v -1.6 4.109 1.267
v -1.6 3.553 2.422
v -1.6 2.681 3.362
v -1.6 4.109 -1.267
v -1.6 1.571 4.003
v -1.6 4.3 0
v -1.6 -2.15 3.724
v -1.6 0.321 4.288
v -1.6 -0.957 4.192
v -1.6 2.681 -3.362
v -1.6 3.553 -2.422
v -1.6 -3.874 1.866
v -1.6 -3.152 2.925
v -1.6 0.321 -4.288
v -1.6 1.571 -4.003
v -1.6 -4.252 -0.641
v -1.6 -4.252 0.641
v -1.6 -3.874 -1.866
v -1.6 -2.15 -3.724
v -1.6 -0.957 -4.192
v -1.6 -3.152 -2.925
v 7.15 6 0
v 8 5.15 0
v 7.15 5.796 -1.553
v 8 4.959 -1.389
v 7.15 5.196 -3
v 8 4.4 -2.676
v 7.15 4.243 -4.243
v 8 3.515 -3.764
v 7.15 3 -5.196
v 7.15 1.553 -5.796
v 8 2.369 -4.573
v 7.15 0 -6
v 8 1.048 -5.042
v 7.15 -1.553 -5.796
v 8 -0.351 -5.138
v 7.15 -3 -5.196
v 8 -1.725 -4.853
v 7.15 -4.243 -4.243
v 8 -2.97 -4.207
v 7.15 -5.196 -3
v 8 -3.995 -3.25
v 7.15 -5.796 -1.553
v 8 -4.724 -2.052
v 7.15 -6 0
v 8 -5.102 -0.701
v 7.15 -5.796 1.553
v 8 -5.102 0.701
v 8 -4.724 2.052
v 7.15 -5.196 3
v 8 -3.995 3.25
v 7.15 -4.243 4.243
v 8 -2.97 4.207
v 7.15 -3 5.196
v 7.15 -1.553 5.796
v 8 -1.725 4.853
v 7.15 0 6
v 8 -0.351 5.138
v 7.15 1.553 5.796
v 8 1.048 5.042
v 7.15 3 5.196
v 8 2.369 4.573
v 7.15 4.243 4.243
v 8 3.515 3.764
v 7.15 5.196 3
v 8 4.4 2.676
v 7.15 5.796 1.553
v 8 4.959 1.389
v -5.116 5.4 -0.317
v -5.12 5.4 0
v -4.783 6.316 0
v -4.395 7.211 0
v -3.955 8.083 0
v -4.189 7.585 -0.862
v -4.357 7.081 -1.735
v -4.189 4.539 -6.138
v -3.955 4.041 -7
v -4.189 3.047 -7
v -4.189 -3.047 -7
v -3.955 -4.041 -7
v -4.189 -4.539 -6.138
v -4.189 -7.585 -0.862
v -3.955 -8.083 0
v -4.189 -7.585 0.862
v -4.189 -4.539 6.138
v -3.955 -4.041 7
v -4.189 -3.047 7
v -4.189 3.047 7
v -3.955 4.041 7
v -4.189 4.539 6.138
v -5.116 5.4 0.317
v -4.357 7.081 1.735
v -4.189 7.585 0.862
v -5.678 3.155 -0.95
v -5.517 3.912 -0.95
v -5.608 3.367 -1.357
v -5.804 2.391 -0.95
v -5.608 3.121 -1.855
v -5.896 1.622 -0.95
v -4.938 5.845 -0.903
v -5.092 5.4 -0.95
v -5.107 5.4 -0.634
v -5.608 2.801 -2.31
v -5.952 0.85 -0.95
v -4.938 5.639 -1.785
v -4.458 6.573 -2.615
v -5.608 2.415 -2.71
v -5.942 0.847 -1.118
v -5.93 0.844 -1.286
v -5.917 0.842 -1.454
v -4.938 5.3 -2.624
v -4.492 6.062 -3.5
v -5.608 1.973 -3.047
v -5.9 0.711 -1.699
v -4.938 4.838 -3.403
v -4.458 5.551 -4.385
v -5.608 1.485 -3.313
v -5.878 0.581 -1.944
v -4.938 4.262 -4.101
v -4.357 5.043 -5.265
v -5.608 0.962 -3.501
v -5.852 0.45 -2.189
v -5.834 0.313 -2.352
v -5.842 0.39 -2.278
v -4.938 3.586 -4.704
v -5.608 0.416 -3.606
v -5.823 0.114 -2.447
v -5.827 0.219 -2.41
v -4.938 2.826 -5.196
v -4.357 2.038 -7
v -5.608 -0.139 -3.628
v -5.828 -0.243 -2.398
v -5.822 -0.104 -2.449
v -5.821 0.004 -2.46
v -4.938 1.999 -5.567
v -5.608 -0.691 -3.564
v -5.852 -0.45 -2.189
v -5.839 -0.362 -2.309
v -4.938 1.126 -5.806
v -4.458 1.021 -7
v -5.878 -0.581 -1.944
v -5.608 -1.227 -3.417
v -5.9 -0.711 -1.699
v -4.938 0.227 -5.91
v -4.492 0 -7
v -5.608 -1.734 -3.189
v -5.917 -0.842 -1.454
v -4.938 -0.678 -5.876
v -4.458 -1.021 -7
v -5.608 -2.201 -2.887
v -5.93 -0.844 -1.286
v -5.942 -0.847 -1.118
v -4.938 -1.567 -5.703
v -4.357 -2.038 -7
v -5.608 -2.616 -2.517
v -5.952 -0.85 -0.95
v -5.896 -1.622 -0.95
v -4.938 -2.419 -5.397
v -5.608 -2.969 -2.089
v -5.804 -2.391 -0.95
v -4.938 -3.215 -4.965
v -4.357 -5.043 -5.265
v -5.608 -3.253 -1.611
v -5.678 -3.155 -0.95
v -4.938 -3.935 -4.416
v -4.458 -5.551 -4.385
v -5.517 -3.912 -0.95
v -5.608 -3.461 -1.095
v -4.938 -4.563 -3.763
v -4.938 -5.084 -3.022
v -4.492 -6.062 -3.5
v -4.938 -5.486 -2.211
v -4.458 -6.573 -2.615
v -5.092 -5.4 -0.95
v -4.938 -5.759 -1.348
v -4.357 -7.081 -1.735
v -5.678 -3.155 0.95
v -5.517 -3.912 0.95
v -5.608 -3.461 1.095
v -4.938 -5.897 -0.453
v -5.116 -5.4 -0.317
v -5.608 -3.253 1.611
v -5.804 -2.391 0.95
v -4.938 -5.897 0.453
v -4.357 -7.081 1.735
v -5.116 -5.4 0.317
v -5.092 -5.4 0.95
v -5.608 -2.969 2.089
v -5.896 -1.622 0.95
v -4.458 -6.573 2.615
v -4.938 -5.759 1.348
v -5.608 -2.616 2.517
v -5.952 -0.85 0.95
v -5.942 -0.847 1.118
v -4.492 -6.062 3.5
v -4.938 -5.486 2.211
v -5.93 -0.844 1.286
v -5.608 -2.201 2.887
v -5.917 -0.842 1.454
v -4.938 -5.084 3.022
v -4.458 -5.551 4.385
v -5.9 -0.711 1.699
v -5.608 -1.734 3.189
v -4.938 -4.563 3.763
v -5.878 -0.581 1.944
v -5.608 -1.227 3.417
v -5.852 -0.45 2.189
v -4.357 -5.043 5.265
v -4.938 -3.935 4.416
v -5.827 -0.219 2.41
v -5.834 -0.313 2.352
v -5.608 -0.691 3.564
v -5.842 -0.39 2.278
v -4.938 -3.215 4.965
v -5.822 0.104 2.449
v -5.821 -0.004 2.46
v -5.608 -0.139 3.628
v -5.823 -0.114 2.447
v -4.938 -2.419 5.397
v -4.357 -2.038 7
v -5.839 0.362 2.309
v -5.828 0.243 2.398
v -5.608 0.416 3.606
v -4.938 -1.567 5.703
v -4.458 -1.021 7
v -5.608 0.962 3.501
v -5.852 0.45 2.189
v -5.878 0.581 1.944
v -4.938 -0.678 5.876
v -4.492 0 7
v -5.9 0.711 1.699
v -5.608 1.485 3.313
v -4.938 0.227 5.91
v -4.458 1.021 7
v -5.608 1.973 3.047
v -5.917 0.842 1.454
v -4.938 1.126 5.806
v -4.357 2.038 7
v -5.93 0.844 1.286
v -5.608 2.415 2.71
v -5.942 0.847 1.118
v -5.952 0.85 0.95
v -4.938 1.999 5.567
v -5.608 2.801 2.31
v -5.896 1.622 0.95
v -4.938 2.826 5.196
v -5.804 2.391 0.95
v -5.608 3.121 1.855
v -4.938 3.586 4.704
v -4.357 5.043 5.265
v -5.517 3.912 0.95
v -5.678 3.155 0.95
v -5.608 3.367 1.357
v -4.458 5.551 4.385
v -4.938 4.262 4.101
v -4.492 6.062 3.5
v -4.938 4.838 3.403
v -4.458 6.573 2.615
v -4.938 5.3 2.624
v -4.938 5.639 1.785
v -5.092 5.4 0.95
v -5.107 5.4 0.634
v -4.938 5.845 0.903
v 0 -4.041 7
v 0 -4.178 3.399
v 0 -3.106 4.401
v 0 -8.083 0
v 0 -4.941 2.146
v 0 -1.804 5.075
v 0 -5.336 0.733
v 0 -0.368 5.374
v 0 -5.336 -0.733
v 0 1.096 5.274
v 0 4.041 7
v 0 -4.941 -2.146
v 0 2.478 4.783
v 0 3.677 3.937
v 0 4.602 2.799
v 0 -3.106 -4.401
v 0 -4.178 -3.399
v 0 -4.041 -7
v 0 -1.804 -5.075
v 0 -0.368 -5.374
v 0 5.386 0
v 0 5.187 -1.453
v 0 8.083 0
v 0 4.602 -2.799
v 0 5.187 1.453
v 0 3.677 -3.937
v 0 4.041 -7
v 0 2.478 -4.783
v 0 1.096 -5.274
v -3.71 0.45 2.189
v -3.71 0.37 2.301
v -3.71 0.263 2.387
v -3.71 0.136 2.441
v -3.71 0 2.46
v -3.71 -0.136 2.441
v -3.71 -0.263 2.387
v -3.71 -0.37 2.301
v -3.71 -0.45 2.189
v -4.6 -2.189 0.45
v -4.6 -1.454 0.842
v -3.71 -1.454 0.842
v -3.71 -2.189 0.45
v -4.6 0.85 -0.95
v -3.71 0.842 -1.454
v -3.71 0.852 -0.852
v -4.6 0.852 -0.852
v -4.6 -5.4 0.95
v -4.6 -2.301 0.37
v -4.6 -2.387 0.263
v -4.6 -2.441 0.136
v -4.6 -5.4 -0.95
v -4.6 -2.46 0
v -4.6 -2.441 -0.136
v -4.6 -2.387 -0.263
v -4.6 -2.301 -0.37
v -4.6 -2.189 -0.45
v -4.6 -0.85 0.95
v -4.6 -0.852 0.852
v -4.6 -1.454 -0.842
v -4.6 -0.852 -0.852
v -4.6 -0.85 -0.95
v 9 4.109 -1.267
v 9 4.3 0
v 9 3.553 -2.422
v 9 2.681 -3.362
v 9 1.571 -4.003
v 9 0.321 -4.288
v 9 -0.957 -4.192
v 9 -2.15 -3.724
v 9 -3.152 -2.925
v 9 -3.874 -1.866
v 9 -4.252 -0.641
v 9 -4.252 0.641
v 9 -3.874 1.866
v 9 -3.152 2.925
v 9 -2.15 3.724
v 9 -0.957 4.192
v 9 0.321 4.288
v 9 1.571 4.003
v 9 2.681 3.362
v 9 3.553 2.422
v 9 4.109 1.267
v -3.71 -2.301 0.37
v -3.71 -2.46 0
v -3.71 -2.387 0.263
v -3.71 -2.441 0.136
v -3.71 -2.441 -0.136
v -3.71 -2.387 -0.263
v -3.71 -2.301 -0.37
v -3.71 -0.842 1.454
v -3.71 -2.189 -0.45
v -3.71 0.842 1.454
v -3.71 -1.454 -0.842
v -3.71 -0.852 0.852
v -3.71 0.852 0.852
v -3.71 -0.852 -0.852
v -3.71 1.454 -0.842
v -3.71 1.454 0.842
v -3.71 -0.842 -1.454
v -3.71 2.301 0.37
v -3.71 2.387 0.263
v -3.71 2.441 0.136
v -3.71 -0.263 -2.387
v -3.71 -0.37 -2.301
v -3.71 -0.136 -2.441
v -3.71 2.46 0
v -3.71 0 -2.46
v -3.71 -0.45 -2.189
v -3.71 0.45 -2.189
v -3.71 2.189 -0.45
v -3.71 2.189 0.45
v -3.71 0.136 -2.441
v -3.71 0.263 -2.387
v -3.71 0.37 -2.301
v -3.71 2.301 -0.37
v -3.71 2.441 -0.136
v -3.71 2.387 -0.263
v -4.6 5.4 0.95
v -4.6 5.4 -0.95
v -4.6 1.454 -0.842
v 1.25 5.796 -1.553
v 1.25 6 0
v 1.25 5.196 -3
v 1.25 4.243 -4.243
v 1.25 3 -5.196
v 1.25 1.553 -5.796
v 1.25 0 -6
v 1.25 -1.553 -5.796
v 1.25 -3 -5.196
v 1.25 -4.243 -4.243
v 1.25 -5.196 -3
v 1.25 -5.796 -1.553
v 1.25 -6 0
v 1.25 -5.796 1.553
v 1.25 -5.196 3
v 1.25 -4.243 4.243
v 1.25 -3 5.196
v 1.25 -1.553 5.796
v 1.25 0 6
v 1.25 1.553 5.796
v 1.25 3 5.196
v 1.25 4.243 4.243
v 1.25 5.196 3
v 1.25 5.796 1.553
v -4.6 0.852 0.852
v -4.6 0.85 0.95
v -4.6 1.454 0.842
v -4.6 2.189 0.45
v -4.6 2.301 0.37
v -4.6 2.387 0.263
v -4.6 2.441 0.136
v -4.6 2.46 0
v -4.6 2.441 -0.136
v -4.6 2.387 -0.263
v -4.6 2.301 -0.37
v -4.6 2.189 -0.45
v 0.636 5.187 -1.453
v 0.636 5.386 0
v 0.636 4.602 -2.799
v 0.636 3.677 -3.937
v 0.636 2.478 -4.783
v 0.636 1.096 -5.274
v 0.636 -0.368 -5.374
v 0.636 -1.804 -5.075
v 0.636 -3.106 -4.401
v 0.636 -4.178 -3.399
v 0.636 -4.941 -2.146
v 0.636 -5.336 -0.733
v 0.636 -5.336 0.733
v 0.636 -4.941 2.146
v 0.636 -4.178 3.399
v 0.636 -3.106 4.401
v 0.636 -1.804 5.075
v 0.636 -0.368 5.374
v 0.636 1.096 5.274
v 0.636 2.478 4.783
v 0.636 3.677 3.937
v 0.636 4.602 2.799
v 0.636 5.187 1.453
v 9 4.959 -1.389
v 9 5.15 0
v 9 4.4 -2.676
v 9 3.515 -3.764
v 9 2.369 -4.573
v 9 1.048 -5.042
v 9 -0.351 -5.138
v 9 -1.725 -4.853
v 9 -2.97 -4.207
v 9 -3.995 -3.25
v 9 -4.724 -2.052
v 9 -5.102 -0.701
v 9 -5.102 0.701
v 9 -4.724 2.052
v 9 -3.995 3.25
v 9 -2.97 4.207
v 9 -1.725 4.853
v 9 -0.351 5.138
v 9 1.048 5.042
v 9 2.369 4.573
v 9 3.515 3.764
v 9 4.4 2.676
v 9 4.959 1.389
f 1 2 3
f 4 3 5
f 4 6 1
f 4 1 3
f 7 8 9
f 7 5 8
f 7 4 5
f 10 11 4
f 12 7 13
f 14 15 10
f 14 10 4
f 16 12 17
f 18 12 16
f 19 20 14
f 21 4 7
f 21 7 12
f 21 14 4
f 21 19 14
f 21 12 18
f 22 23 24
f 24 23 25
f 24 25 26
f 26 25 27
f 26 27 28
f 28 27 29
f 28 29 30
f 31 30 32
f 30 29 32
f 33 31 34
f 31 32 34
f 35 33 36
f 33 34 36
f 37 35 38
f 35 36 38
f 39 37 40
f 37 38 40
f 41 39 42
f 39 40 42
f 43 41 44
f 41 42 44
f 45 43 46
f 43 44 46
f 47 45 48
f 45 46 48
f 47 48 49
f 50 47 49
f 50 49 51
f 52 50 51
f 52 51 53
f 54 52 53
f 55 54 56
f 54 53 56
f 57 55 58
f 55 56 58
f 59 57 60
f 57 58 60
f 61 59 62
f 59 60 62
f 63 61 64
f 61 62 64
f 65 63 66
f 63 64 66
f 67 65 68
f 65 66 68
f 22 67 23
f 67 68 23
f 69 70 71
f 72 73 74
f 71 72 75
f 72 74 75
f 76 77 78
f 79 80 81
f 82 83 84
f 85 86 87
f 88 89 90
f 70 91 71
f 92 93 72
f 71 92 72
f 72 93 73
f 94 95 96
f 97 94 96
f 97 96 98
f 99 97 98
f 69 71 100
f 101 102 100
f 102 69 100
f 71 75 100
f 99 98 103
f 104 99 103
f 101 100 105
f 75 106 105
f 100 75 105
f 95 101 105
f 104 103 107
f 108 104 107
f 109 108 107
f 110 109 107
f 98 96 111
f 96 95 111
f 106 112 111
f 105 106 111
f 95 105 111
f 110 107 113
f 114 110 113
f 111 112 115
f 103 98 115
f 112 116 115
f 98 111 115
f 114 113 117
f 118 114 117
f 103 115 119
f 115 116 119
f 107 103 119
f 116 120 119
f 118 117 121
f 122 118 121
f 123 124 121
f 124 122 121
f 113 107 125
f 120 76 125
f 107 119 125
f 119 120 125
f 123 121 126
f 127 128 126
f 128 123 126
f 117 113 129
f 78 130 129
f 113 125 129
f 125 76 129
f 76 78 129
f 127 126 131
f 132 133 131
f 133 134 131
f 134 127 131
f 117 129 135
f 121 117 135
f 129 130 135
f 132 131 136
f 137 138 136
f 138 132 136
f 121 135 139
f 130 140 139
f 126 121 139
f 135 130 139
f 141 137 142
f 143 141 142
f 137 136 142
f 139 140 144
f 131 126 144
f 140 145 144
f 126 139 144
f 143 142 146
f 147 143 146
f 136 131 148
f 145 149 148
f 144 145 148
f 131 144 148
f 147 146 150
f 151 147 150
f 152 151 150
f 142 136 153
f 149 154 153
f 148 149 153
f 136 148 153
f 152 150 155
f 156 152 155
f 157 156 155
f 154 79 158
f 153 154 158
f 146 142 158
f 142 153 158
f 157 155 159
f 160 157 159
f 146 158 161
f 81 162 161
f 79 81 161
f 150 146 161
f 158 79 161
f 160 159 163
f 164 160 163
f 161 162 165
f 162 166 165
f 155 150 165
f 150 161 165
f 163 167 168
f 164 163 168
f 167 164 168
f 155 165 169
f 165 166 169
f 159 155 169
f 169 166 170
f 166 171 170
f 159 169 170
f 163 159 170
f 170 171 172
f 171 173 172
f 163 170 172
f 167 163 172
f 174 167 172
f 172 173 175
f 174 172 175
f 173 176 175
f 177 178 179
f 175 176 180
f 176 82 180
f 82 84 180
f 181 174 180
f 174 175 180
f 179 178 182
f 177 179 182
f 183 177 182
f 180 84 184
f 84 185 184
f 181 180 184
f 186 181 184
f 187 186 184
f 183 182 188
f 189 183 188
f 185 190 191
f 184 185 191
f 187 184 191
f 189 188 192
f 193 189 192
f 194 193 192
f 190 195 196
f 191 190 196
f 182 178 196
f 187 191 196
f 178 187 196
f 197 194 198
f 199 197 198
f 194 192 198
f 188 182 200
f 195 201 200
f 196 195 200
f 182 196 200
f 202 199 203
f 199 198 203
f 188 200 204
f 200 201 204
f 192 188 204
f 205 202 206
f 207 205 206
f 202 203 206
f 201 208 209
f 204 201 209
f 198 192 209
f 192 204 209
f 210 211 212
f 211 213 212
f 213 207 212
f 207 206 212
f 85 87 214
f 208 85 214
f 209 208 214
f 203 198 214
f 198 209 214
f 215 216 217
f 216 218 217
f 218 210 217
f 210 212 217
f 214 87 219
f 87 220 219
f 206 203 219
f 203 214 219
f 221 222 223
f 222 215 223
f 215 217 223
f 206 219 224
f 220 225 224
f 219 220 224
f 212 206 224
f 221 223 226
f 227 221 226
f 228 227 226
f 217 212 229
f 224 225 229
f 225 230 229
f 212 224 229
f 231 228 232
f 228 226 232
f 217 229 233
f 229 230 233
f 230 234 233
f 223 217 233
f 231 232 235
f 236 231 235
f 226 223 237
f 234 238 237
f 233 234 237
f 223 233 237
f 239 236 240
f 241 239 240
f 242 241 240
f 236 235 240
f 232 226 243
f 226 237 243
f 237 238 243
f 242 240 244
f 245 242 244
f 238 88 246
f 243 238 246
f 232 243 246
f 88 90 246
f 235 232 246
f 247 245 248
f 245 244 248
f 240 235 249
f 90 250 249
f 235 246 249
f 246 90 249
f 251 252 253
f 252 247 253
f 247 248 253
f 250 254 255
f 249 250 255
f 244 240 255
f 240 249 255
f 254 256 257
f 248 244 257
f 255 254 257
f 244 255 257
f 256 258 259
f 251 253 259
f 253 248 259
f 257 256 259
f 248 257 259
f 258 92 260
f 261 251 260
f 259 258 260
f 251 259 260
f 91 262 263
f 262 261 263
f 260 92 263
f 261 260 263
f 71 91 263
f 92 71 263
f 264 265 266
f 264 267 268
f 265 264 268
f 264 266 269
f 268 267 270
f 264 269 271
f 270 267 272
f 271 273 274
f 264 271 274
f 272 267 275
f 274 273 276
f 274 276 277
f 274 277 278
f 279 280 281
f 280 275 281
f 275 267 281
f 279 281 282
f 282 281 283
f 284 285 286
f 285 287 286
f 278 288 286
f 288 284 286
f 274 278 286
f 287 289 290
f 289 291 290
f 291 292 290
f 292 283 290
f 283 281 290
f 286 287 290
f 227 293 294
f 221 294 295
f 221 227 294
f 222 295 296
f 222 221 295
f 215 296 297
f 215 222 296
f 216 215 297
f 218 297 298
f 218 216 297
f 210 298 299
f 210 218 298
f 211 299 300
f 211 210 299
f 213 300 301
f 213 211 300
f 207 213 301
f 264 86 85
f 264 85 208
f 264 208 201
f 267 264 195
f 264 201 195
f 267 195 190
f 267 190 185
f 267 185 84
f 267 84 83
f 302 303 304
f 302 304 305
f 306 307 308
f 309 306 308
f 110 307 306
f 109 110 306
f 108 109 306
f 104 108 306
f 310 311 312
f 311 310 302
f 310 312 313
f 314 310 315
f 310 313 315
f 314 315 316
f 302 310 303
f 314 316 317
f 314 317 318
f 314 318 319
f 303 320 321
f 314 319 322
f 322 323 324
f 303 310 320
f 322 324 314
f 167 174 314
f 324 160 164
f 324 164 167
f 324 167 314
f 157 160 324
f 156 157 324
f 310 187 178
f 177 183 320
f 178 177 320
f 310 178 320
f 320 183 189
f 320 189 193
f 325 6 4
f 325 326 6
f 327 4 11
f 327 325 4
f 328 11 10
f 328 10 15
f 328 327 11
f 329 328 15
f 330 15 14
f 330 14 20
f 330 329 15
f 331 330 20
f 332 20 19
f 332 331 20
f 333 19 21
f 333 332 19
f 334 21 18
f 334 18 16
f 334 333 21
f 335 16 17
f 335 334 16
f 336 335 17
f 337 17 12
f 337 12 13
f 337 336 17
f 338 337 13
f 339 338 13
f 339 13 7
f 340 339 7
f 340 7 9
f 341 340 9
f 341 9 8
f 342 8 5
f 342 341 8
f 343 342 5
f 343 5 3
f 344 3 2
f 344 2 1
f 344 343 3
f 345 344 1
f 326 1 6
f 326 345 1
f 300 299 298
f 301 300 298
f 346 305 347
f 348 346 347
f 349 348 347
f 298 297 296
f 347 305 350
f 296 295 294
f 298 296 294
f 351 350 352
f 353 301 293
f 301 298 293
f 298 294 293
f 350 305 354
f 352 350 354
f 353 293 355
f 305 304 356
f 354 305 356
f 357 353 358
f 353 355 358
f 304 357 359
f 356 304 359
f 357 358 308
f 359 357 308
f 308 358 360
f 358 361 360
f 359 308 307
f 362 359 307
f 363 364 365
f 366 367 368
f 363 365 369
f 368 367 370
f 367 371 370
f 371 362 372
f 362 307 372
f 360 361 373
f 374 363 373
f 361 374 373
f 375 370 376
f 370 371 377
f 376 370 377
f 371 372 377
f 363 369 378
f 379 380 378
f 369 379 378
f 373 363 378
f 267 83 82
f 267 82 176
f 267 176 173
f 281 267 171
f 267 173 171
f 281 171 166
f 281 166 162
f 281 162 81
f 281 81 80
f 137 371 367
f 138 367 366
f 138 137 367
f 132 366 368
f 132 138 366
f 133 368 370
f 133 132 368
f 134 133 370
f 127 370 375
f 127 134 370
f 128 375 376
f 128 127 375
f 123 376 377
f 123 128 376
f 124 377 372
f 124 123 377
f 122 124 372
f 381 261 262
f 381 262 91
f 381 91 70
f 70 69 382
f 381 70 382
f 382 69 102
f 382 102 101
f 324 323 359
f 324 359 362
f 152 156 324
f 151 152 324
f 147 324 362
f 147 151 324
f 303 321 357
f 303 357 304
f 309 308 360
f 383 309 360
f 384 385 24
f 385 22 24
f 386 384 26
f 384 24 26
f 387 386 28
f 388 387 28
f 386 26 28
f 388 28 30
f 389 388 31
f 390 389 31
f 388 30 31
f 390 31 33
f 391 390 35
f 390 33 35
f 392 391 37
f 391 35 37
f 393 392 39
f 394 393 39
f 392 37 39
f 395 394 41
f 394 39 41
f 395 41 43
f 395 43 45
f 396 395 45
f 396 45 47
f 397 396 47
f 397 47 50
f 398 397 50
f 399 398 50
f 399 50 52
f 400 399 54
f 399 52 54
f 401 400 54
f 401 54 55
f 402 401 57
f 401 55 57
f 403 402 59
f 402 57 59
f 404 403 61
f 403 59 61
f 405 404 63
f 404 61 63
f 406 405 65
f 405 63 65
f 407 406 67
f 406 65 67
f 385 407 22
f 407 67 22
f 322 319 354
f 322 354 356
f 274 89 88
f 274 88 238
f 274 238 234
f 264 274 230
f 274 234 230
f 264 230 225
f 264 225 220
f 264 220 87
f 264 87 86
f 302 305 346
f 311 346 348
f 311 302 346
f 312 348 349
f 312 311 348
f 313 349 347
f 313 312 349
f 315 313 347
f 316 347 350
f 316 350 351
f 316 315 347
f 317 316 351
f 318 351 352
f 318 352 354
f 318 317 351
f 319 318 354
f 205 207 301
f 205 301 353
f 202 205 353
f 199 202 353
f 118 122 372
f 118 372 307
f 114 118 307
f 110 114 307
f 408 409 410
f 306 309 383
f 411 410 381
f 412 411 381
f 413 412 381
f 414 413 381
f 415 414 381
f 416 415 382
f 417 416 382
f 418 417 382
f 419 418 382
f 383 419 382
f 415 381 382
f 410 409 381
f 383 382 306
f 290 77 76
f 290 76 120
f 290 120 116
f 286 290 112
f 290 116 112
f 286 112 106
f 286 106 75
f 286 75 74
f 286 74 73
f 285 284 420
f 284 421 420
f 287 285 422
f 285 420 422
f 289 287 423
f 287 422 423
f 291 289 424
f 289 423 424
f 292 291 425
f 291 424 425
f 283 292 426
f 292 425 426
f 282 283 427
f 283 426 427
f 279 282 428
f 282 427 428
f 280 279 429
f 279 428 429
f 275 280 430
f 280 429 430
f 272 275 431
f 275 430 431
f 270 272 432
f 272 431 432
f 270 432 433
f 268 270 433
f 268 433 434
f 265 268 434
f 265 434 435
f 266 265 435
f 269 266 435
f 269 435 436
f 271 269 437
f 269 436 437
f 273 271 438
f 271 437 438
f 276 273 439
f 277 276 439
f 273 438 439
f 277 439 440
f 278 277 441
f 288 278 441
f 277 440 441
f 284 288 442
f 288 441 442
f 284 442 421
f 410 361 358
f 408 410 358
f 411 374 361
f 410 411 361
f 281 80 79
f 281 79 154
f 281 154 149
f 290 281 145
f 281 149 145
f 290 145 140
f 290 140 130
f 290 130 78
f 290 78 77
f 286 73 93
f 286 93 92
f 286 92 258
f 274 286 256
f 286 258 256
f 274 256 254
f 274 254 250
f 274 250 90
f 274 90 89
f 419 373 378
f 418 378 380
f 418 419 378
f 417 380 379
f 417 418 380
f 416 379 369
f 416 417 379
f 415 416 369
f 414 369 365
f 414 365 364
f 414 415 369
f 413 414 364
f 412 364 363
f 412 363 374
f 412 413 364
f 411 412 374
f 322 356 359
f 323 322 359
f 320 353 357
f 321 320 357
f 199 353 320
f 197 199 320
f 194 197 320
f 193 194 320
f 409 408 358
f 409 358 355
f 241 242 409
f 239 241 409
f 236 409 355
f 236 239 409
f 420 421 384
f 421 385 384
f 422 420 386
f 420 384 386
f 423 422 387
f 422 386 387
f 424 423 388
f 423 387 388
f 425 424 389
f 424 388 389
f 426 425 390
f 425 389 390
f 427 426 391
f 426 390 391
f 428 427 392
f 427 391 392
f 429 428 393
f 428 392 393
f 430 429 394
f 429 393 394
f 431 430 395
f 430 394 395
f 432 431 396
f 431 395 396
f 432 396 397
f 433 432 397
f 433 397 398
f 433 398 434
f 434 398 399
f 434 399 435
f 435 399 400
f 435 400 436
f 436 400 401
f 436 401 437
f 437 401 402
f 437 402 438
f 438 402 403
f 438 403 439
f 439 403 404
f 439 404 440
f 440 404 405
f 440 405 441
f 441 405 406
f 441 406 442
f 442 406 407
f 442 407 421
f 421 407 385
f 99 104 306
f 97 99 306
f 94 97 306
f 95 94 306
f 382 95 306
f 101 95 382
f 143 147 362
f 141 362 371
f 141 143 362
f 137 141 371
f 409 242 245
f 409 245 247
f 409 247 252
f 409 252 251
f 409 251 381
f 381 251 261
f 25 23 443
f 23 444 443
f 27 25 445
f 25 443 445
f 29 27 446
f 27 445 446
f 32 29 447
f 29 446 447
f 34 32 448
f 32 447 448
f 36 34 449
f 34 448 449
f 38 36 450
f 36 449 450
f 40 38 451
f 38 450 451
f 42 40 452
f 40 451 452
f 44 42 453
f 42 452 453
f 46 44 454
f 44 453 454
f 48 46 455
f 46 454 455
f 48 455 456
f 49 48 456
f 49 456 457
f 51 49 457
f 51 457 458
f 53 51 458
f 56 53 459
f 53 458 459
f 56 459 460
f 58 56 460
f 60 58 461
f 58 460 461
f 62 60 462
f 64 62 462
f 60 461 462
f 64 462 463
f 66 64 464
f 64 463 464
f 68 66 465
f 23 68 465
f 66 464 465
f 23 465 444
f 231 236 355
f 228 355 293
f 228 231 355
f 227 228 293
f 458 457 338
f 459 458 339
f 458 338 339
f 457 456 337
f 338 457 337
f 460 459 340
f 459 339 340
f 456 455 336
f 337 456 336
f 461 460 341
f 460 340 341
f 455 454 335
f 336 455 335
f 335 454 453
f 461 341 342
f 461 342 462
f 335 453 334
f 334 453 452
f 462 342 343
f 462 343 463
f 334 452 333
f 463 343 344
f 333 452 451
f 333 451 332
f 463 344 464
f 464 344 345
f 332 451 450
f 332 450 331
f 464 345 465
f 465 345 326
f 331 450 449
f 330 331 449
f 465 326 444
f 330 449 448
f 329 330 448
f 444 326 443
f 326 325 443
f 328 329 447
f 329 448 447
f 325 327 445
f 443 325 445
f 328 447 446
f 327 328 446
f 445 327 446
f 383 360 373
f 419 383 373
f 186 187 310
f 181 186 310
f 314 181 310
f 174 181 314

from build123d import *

# Parameters (mm, degrees)
SKETCH2_W          = 10.6
SKETCH2_H          = 4.3
SKETCH3_W          = 40
SKETCH3_H          = 40
CUT_EXTRUDE1_DEPTH = 6.5
CUT_EXTRUDE2_DEPTH = 2.29
SKETCH5_W          = 1.9
SKETCH5_H          = 10.8
CUT_EXTRUDE3_DEPTH = 1.4


with BuildPart() as part:
    # Sketch1 → Revolve1 (revolve)
    with BuildSketch(Plane.XY):
        with BuildLine():
            Line((-2.490737563, 10), (0, 10))
            Line((0, 10), (0, 5.3865))
            Line((0, 5.3865), (0.6365, 5.3865))
            Line((0.6365, 5.3865), (1.25, 6))
            Line((1.25, 6), (7.15, 6))
            Line((7.15, 6), (8, 5.15))
            Line((8, 5.15), (9, 5.15))
            Line((9, 5.15), (9, 0))
            Line((9, 0), (-6, 0))
            ThreePointArc((-6, 0), (-5.206361598, 5.133599494), (-2.899547792, 9.787878788))
            ThreePointArc((-2.899547792, 9.787878788), (-2.721020656, 9.943812682), (-2.490737563, 10))
        make_face()
    revolve(axis=Axis((9, 0, 0), (-1, 0, 0)))

    # Sketch2 → Cut-Revolve1 (revolve, cut)
    with BuildSketch(Plane.XY):
        with Locations((3.7, 2.15)):
            Rectangle(SKETCH2_W, SKETCH2_H)
    revolve(axis=Axis((9, 0, 0), (-1, 0, 0)), mode=Mode.SUBTRACT)

    # Sketch3 → Cut-Extrude1 (cut)
    with BuildSketch(Plane(origin=(-6, 0, 0), x_dir=(0, 0, -1), z_dir=(1, 0, 0))):
        Rectangle(SKETCH3_W, SKETCH3_H)
        Polygon((-7, -4.041451884), (0, -8.082903769), (7, -4.041451884), (7, 4.041451884), (0, 8.082903769), (-7, 4.041451884), align=None, mode=Mode.SUBTRACT)
    extrude(amount=CUT_EXTRUDE1_DEPTH, mode=Mode.SUBTRACT)

    # Sketch4 → Cut-Extrude2 (cut)
    with BuildSketch(Plane(origin=(-6, 0, 0), x_dir=(0, 0, -1), z_dir=(1, 0, 0))):
        with BuildLine():
            Line((-2.189430305, -0.450302912), (-1.45357474, -0.841564257))
            Line((-1.45357474, -0.841564257), (-0.852063671, -0.852063671))
            Line((-0.852063671, -0.852063671), (-0.841564257, -1.45357474))
            Line((-0.841564257, -1.45357474), (-0.450302912, -2.189430305))
            ThreePointArc((-0.450302912, -2.189430305), (0, -2.459999131), (0.450302912, -2.189430305))
            Line((0.450302912, -2.189430305), (0.841564257, -1.45357474))
            Line((0.841564257, -1.45357474), (0.852063671, -0.852063671))
            Line((0.852063671, -0.852063671), (1.45357474, -0.841564257))
            Line((1.45357474, -0.841564257), (2.189430305, -0.450302912))
            ThreePointArc((2.189430305, -0.450302912), (2.459999131, 0), (2.189430305, 0.450302912))
            Line((2.189430305, 0.450302912), (1.45357474, 0.841564257))
            Line((1.45357474, 0.841564257), (0.852063671, 0.852063671))
            Line((0.852063671, 0.852063671), (0.841564257, 1.45357474))
            Line((0.841564257, 1.45357474), (0.450302912, 2.189430305))
            ThreePointArc((0.450302912, 2.189430305), (0, 2.459999131), (-0.450302912, 2.189430305))
            Line((-0.450302912, 2.189430305), (-0.841564257, 1.45357474))
            Line((-0.841564257, 1.45357474), (-0.852063671, 0.852063671))
            Line((-0.852063671, 0.852063671), (-1.45357474, 0.841564257))
            Line((-1.45357474, 0.841564257), (-2.189430305, 0.450302912))
            ThreePointArc((-2.189430305, 0.450302912), (-2.459999131, 0), (-2.189430305, -0.450302912))
        make_face()
    extrude(amount=CUT_EXTRUDE2_DEPTH, mode=Mode.SUBTRACT)

    # Sketch5 → Cut-Extrude3 (cut)
    with BuildSketch(Plane(origin=(-6, 0, 0), x_dir=(0, 0, -1), z_dir=(1, 0, 0))):
        Rectangle(SKETCH5_W, SKETCH5_H)
    extrude(amount=CUT_EXTRUDE3_DEPTH, mode=Mode.SUBTRACT)


solid = part.part
